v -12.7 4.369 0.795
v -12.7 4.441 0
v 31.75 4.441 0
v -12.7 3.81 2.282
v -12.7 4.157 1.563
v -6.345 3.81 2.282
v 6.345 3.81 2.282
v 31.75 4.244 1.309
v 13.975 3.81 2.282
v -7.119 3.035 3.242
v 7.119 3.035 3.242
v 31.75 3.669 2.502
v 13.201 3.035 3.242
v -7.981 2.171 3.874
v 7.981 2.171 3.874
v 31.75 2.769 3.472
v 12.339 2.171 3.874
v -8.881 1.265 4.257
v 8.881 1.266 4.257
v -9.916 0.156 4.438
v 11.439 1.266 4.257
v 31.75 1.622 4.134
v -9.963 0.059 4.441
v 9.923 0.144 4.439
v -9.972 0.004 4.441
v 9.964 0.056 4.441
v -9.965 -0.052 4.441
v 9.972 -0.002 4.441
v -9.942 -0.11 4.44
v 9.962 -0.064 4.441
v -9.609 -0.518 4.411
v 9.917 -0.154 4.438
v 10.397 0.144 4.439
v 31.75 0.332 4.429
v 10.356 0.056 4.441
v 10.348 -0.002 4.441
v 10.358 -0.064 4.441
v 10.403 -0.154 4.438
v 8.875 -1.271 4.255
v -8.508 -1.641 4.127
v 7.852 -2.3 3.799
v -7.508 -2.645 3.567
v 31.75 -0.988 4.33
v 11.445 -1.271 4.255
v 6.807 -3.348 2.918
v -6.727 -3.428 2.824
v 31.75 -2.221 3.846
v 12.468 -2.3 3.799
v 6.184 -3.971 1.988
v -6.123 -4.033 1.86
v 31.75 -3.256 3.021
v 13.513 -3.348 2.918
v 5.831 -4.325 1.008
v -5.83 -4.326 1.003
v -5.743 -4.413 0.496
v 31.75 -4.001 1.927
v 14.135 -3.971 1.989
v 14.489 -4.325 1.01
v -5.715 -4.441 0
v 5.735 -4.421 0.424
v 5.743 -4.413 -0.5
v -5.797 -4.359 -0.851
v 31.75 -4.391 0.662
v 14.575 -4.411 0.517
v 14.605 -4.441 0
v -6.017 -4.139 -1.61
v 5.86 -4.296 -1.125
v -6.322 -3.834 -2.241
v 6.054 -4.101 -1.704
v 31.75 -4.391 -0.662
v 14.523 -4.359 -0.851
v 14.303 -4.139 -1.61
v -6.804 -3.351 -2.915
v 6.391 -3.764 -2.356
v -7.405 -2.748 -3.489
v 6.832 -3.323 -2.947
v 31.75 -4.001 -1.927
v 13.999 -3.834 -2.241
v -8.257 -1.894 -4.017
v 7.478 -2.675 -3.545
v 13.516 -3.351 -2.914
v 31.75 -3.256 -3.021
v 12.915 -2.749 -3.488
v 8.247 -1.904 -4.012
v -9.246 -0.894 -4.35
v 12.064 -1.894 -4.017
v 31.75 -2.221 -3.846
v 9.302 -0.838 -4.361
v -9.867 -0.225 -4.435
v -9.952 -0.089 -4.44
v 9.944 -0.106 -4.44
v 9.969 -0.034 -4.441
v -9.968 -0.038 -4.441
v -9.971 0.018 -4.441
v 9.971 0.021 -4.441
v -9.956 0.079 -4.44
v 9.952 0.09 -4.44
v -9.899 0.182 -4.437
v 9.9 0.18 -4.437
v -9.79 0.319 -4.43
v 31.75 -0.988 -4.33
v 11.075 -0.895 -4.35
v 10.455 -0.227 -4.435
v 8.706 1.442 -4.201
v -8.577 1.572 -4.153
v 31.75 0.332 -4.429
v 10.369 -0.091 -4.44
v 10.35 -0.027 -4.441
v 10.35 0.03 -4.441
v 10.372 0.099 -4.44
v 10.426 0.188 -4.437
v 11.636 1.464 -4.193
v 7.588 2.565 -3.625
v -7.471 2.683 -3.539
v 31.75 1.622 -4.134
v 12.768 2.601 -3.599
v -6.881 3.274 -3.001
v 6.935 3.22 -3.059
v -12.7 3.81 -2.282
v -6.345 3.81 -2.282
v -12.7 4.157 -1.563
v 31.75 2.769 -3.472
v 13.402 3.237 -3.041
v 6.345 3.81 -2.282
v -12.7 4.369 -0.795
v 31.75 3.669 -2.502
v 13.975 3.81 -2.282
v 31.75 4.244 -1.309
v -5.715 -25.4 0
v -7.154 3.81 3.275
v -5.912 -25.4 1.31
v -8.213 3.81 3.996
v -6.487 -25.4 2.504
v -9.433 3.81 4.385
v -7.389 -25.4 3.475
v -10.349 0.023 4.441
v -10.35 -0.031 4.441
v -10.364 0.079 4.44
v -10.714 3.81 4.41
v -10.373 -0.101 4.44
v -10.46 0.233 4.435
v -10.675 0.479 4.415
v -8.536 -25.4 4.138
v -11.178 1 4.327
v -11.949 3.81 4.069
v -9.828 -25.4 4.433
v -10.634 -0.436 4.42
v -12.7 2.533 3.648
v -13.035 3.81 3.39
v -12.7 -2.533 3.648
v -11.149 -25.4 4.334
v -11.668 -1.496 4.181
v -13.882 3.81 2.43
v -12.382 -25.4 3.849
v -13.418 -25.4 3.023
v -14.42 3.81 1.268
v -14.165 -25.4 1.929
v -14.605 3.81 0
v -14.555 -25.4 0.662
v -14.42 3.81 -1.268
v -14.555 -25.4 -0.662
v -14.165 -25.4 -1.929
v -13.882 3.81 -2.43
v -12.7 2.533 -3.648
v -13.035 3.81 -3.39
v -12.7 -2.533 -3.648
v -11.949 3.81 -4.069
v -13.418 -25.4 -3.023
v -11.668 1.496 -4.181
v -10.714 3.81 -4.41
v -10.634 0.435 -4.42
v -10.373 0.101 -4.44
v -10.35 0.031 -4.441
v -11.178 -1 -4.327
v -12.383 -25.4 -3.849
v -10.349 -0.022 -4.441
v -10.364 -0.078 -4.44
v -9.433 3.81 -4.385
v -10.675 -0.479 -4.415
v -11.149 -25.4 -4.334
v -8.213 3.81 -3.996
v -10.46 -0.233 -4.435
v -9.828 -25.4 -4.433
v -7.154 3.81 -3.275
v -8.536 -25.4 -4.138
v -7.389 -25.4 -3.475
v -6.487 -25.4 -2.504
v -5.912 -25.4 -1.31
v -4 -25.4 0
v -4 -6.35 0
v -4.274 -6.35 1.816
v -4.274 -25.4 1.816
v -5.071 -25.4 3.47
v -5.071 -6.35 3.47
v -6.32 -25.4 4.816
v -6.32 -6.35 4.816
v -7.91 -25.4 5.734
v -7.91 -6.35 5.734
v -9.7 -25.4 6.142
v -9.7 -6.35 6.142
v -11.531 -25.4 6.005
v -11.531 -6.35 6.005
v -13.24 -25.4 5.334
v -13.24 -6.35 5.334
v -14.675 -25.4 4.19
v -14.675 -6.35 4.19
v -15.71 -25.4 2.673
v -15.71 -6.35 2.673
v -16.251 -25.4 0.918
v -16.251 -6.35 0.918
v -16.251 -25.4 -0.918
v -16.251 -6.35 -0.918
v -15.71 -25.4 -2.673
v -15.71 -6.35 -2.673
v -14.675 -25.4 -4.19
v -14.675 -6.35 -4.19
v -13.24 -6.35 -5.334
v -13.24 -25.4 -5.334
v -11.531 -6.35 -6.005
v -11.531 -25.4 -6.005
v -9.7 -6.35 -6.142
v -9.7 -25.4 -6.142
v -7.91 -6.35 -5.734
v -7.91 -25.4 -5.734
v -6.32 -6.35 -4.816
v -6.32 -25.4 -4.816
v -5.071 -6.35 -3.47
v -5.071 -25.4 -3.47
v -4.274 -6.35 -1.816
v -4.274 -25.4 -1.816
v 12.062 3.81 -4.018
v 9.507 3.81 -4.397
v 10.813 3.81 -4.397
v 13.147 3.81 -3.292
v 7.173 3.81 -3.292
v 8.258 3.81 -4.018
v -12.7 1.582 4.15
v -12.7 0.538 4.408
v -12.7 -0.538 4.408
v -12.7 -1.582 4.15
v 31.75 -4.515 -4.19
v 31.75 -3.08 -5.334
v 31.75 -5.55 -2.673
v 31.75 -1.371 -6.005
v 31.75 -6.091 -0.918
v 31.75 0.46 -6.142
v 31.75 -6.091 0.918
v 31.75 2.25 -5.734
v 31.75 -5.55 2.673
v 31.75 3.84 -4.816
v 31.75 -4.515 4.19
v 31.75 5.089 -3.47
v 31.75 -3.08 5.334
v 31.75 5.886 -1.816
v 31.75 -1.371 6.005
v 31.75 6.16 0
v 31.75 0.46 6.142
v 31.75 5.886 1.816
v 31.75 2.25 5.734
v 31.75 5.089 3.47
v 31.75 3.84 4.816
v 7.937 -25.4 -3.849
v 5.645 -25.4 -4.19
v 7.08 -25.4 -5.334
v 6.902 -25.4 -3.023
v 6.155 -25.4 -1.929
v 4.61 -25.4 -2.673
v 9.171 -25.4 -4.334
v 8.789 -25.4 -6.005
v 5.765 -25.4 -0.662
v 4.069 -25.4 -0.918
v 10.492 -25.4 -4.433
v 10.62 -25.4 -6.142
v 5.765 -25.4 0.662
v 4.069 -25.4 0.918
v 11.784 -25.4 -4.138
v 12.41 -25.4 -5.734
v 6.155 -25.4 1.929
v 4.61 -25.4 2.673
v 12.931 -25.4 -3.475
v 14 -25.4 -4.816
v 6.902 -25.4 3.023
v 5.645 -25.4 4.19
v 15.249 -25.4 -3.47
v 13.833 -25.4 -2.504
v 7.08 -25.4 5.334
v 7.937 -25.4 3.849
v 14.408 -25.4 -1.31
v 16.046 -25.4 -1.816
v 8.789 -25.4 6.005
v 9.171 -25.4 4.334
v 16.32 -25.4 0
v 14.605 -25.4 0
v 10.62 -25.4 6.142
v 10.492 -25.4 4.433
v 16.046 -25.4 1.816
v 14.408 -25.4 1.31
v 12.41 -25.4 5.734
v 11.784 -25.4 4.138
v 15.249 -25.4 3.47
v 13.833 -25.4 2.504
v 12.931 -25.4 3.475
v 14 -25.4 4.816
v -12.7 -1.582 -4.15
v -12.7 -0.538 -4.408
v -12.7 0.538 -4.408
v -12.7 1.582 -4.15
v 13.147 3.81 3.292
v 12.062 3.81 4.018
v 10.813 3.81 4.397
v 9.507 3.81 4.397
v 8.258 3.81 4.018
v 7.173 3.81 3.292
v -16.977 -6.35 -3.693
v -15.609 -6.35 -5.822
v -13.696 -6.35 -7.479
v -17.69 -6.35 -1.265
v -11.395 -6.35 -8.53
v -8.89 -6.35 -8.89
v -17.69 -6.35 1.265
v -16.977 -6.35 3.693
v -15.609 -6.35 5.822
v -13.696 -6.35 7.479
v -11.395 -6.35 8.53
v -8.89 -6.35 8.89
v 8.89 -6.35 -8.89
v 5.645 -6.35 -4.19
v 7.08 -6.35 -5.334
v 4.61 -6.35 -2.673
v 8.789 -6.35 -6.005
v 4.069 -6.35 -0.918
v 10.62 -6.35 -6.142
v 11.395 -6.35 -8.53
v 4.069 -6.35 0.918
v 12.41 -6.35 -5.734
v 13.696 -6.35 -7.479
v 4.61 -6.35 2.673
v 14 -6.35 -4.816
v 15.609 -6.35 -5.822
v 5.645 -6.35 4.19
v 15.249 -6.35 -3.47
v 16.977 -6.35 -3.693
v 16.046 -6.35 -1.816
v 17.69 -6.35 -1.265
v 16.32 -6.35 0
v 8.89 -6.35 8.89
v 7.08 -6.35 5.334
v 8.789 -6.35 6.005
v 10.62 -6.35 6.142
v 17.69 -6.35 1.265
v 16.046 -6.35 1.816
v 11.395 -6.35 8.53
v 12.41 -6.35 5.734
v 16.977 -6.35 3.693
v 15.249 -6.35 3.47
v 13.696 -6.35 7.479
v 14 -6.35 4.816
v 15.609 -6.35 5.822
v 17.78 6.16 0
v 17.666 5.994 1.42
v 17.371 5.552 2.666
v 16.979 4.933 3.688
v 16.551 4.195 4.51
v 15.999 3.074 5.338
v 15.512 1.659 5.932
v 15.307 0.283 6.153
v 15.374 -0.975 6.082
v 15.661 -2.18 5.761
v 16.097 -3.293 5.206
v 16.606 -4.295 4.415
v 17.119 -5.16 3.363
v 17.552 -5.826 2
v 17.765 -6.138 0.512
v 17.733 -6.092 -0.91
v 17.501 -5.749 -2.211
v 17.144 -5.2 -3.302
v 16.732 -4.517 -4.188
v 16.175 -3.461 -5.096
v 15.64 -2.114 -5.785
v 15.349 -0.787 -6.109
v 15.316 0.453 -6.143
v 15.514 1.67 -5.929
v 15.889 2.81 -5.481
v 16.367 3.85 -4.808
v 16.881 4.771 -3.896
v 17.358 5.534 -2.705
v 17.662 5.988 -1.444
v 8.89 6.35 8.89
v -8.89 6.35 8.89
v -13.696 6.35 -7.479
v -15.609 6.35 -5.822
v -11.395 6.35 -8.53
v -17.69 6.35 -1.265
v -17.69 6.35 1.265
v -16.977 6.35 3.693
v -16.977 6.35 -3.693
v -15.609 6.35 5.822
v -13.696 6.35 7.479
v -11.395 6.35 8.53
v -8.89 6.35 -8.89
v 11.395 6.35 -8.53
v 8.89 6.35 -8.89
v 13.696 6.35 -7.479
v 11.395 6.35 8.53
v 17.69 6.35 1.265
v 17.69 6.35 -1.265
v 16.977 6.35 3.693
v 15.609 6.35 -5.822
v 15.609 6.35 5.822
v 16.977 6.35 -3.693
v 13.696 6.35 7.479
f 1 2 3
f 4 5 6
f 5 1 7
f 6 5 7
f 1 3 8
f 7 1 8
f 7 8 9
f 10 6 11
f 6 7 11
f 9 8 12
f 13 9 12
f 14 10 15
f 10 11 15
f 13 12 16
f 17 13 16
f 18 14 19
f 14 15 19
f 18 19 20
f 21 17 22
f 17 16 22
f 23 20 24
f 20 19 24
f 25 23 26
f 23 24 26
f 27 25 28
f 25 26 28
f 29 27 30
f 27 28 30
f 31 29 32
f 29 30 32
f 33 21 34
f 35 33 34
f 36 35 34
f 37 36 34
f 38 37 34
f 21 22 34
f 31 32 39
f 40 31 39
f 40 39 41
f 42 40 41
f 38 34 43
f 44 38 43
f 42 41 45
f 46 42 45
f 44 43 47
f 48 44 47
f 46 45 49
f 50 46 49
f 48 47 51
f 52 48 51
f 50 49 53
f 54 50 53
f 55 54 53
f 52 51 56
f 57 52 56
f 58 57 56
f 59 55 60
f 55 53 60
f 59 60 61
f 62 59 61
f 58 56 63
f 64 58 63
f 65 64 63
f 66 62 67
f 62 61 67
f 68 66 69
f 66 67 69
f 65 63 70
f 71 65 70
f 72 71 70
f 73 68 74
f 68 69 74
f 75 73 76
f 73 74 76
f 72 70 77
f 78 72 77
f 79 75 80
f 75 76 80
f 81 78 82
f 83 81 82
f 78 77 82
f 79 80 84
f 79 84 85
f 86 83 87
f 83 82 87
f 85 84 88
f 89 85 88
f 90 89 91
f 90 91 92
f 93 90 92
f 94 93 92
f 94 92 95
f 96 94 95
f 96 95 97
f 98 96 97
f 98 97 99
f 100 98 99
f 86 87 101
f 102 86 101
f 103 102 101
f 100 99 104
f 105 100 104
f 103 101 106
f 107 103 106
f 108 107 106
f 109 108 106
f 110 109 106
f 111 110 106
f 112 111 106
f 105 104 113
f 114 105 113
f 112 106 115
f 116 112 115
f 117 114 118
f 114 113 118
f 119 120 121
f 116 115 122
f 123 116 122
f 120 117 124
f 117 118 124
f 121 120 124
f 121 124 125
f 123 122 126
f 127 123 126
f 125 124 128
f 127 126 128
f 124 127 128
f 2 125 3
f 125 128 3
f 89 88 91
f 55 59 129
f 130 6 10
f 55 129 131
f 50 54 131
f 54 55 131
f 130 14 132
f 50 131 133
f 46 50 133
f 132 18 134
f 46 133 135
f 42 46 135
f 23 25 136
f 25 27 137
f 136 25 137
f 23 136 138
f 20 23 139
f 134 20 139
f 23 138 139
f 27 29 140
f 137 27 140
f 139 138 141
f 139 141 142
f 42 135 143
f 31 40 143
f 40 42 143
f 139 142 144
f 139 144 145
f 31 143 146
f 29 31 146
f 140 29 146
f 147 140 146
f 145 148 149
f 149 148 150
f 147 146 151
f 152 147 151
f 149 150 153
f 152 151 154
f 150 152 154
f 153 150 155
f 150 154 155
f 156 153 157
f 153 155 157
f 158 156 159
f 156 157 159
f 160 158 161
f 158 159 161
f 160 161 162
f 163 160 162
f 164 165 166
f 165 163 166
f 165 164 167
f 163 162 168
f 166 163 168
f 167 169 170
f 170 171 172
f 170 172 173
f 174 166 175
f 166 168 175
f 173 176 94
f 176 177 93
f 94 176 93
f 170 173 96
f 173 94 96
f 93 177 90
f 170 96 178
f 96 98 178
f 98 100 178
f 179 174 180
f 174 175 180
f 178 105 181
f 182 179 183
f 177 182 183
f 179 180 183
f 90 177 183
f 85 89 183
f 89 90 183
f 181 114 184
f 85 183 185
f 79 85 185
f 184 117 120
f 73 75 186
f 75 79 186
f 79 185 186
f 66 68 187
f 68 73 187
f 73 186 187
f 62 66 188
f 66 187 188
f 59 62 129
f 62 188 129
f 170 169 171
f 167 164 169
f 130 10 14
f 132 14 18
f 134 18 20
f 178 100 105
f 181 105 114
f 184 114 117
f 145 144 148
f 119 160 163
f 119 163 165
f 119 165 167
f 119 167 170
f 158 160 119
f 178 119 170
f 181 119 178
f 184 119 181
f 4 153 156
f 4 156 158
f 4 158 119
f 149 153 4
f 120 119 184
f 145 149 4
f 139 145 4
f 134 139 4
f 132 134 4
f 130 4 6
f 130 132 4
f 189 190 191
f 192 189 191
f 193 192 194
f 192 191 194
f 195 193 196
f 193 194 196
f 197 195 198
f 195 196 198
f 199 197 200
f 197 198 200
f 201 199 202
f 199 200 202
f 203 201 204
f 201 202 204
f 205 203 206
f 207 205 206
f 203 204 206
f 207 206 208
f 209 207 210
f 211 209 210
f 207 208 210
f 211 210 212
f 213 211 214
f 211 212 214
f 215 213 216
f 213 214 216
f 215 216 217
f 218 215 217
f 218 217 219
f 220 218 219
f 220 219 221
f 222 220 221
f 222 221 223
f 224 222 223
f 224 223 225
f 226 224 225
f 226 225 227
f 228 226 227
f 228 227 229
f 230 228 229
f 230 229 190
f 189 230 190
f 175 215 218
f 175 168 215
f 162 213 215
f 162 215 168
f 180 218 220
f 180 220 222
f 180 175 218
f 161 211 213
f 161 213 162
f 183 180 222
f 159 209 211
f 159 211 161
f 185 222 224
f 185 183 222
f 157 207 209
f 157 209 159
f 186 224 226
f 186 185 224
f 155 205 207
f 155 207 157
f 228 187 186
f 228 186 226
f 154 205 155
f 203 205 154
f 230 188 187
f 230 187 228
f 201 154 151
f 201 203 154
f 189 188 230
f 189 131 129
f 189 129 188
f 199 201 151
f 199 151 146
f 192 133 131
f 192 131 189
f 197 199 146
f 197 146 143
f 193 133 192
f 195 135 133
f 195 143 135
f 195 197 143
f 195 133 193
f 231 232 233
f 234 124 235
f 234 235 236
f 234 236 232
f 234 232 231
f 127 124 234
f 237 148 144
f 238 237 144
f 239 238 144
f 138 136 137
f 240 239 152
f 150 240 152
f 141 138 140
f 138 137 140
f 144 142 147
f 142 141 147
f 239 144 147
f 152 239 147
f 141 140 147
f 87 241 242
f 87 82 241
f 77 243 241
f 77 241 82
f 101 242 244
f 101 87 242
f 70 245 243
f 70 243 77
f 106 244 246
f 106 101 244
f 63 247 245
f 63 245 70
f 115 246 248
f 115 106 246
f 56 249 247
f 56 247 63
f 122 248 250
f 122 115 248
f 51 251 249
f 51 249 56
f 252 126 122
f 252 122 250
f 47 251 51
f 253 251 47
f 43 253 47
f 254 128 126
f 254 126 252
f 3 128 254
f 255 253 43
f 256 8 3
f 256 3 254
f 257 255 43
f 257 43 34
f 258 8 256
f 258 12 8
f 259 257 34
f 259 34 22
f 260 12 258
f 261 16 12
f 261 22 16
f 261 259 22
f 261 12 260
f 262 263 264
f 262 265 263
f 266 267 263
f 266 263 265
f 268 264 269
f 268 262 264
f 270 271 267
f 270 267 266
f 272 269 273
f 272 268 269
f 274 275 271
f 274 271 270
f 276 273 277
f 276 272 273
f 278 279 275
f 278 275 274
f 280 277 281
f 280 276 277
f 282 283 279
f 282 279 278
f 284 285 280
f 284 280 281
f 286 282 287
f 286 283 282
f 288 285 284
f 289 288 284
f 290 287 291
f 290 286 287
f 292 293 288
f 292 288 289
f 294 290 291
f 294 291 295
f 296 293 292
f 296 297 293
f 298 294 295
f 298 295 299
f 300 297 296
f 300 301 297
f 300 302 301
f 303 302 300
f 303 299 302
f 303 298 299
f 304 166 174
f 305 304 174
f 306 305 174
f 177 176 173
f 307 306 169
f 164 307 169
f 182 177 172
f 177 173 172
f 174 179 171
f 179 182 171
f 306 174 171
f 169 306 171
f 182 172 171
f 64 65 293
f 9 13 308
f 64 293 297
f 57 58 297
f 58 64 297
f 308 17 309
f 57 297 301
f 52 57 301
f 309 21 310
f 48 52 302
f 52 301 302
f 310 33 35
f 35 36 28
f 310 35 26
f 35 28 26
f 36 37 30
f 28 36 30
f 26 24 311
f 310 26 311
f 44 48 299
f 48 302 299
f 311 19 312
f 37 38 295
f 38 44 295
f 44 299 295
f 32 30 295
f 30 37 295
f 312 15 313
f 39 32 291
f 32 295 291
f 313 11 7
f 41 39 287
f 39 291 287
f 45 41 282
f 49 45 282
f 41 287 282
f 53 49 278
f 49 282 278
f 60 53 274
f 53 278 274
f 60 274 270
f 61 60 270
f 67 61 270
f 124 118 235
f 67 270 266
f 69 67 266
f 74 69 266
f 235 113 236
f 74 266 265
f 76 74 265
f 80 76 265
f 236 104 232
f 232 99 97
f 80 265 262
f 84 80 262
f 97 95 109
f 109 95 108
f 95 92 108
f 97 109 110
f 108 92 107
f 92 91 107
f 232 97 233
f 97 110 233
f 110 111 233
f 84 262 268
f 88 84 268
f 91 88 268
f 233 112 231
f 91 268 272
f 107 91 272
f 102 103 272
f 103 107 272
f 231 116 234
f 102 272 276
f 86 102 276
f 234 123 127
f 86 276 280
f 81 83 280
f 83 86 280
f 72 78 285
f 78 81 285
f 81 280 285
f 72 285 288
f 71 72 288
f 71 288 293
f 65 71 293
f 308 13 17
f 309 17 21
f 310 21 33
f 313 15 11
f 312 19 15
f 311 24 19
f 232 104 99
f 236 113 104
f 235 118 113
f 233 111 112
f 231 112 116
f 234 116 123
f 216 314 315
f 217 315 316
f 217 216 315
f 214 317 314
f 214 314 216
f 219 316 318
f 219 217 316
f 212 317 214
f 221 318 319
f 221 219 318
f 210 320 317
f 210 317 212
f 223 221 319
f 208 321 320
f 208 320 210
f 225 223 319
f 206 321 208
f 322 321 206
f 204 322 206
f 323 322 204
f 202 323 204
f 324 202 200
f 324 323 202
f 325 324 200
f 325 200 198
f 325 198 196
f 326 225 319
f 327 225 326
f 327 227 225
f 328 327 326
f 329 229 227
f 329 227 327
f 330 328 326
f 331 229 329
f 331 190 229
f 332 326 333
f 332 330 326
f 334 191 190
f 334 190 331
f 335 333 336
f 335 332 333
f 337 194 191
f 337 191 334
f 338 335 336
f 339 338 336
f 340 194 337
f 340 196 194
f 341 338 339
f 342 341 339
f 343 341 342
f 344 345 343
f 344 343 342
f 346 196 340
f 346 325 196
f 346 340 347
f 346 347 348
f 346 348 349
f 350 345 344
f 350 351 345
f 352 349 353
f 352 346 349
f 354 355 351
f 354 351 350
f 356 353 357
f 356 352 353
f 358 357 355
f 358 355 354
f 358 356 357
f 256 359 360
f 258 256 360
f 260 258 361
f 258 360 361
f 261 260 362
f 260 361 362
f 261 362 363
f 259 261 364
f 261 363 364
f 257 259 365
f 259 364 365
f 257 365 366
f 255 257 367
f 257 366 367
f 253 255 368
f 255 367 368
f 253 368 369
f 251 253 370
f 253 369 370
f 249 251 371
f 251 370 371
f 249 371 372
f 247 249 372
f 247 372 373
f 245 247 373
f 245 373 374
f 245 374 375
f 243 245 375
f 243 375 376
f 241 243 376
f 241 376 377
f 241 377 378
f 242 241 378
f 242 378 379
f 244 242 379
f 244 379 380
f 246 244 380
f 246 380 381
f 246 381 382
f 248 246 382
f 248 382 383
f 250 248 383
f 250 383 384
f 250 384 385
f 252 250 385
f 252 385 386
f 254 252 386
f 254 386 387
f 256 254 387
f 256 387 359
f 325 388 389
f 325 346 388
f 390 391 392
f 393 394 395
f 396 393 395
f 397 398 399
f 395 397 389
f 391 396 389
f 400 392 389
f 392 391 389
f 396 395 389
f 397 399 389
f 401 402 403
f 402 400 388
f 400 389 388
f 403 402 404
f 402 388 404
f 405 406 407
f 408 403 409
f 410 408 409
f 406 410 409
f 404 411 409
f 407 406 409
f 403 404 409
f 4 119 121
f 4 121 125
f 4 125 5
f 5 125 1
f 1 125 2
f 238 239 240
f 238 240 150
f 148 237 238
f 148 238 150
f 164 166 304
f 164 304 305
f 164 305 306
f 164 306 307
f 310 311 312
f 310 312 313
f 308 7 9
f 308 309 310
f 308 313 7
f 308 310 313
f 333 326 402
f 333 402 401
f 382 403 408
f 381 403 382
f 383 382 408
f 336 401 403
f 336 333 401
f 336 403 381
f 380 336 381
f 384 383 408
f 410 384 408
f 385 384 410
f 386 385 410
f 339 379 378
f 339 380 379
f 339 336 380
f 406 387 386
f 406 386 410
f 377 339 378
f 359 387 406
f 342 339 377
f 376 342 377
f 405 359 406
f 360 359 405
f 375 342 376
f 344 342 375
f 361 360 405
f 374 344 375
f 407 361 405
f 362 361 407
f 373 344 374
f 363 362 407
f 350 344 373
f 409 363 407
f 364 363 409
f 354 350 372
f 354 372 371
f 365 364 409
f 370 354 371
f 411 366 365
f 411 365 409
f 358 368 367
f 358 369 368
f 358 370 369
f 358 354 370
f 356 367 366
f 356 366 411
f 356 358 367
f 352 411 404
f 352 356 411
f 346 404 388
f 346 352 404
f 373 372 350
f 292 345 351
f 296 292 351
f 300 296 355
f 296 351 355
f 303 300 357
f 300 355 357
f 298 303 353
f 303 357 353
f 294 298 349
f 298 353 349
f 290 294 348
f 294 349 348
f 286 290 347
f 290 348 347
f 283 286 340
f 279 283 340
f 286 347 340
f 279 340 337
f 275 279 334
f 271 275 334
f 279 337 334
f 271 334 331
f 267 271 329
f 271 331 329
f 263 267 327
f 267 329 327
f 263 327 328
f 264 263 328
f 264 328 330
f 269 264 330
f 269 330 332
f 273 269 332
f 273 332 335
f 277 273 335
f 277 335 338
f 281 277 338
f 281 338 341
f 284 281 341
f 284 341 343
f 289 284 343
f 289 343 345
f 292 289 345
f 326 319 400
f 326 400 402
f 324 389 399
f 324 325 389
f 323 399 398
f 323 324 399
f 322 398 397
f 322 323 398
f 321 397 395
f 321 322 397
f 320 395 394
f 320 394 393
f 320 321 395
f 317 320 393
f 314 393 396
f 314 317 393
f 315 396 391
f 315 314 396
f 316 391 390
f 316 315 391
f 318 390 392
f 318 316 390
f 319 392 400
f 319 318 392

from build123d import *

# Parameters (mm, degrees)
F0_R     = 6.1595
F1_DEPTH = 25.4
F3_DEPTH = 6.35
F4_R     = 6.1595
F5_DEPTH = 31.75
F6_R     = 4.441025895
F7_DEPTH = 44.45
F8_R     = 4.445
F9_DEPTH = 29.21


with BuildPart() as f1:
    # F0 (on Front) → F1 (new body)
    with BuildSketch(Plane.XZ):
        with Locations((10.16, 0)):
            Circle(F0_R)
    extrude(amount=F1_DEPTH)



with BuildPart() as f1b:
    # F0 (on Front) → F1, piece 2 (new body)
    with BuildSketch(Plane.XZ):
        with Locations((-10.16, 0)):
            Circle(F0_R)
    extrude(amount=F1_DEPTH)


with BuildPart() as f1_1:
    add(f1.part)

    add(f1b.part)  # F3 merges F1b
    # F2 (on Front) → F3 (join, symmetric)
    with BuildSketch(Plane.XZ):
        with BuildLine():
            ThreePointArc((-8.89, 8.89), (-17.78, 0), (-8.89, -8.89))
            Line((-8.89, -8.89), (8.89, -8.89))
            ThreePointArc((8.89, -8.89), (17.78, 0), (8.89, 8.89))
            Line((8.89, 8.89), (-8.89, 8.89))
        make_face()
    extrude(amount=F3_DEPTH, both=True)

    # F4 (on Right) → F5 (join)
    with BuildSketch(Plane.YZ):
        Circle(F4_R)
    extrude(amount=F5_DEPTH)

    # F6 (on face) → F7 (cut)
    with BuildSketch(Plane.YZ.offset(31.75)):
        Circle(F6_R)
    extrude(amount=-F7_DEPTH, mode=Mode.SUBTRACT)

    # F8 (on face) → F9 (cut)
    with BuildSketch(Plane.XZ.offset(25.4)):
        with Locations((-10.16, 0)):
            Circle(F8_R)
        with Locations((10.16, 0)):
            Circle(F8_R)
    extrude(amount=-F9_DEPTH, mode=Mode.SUBTRACT)


solid = f1_1.part
